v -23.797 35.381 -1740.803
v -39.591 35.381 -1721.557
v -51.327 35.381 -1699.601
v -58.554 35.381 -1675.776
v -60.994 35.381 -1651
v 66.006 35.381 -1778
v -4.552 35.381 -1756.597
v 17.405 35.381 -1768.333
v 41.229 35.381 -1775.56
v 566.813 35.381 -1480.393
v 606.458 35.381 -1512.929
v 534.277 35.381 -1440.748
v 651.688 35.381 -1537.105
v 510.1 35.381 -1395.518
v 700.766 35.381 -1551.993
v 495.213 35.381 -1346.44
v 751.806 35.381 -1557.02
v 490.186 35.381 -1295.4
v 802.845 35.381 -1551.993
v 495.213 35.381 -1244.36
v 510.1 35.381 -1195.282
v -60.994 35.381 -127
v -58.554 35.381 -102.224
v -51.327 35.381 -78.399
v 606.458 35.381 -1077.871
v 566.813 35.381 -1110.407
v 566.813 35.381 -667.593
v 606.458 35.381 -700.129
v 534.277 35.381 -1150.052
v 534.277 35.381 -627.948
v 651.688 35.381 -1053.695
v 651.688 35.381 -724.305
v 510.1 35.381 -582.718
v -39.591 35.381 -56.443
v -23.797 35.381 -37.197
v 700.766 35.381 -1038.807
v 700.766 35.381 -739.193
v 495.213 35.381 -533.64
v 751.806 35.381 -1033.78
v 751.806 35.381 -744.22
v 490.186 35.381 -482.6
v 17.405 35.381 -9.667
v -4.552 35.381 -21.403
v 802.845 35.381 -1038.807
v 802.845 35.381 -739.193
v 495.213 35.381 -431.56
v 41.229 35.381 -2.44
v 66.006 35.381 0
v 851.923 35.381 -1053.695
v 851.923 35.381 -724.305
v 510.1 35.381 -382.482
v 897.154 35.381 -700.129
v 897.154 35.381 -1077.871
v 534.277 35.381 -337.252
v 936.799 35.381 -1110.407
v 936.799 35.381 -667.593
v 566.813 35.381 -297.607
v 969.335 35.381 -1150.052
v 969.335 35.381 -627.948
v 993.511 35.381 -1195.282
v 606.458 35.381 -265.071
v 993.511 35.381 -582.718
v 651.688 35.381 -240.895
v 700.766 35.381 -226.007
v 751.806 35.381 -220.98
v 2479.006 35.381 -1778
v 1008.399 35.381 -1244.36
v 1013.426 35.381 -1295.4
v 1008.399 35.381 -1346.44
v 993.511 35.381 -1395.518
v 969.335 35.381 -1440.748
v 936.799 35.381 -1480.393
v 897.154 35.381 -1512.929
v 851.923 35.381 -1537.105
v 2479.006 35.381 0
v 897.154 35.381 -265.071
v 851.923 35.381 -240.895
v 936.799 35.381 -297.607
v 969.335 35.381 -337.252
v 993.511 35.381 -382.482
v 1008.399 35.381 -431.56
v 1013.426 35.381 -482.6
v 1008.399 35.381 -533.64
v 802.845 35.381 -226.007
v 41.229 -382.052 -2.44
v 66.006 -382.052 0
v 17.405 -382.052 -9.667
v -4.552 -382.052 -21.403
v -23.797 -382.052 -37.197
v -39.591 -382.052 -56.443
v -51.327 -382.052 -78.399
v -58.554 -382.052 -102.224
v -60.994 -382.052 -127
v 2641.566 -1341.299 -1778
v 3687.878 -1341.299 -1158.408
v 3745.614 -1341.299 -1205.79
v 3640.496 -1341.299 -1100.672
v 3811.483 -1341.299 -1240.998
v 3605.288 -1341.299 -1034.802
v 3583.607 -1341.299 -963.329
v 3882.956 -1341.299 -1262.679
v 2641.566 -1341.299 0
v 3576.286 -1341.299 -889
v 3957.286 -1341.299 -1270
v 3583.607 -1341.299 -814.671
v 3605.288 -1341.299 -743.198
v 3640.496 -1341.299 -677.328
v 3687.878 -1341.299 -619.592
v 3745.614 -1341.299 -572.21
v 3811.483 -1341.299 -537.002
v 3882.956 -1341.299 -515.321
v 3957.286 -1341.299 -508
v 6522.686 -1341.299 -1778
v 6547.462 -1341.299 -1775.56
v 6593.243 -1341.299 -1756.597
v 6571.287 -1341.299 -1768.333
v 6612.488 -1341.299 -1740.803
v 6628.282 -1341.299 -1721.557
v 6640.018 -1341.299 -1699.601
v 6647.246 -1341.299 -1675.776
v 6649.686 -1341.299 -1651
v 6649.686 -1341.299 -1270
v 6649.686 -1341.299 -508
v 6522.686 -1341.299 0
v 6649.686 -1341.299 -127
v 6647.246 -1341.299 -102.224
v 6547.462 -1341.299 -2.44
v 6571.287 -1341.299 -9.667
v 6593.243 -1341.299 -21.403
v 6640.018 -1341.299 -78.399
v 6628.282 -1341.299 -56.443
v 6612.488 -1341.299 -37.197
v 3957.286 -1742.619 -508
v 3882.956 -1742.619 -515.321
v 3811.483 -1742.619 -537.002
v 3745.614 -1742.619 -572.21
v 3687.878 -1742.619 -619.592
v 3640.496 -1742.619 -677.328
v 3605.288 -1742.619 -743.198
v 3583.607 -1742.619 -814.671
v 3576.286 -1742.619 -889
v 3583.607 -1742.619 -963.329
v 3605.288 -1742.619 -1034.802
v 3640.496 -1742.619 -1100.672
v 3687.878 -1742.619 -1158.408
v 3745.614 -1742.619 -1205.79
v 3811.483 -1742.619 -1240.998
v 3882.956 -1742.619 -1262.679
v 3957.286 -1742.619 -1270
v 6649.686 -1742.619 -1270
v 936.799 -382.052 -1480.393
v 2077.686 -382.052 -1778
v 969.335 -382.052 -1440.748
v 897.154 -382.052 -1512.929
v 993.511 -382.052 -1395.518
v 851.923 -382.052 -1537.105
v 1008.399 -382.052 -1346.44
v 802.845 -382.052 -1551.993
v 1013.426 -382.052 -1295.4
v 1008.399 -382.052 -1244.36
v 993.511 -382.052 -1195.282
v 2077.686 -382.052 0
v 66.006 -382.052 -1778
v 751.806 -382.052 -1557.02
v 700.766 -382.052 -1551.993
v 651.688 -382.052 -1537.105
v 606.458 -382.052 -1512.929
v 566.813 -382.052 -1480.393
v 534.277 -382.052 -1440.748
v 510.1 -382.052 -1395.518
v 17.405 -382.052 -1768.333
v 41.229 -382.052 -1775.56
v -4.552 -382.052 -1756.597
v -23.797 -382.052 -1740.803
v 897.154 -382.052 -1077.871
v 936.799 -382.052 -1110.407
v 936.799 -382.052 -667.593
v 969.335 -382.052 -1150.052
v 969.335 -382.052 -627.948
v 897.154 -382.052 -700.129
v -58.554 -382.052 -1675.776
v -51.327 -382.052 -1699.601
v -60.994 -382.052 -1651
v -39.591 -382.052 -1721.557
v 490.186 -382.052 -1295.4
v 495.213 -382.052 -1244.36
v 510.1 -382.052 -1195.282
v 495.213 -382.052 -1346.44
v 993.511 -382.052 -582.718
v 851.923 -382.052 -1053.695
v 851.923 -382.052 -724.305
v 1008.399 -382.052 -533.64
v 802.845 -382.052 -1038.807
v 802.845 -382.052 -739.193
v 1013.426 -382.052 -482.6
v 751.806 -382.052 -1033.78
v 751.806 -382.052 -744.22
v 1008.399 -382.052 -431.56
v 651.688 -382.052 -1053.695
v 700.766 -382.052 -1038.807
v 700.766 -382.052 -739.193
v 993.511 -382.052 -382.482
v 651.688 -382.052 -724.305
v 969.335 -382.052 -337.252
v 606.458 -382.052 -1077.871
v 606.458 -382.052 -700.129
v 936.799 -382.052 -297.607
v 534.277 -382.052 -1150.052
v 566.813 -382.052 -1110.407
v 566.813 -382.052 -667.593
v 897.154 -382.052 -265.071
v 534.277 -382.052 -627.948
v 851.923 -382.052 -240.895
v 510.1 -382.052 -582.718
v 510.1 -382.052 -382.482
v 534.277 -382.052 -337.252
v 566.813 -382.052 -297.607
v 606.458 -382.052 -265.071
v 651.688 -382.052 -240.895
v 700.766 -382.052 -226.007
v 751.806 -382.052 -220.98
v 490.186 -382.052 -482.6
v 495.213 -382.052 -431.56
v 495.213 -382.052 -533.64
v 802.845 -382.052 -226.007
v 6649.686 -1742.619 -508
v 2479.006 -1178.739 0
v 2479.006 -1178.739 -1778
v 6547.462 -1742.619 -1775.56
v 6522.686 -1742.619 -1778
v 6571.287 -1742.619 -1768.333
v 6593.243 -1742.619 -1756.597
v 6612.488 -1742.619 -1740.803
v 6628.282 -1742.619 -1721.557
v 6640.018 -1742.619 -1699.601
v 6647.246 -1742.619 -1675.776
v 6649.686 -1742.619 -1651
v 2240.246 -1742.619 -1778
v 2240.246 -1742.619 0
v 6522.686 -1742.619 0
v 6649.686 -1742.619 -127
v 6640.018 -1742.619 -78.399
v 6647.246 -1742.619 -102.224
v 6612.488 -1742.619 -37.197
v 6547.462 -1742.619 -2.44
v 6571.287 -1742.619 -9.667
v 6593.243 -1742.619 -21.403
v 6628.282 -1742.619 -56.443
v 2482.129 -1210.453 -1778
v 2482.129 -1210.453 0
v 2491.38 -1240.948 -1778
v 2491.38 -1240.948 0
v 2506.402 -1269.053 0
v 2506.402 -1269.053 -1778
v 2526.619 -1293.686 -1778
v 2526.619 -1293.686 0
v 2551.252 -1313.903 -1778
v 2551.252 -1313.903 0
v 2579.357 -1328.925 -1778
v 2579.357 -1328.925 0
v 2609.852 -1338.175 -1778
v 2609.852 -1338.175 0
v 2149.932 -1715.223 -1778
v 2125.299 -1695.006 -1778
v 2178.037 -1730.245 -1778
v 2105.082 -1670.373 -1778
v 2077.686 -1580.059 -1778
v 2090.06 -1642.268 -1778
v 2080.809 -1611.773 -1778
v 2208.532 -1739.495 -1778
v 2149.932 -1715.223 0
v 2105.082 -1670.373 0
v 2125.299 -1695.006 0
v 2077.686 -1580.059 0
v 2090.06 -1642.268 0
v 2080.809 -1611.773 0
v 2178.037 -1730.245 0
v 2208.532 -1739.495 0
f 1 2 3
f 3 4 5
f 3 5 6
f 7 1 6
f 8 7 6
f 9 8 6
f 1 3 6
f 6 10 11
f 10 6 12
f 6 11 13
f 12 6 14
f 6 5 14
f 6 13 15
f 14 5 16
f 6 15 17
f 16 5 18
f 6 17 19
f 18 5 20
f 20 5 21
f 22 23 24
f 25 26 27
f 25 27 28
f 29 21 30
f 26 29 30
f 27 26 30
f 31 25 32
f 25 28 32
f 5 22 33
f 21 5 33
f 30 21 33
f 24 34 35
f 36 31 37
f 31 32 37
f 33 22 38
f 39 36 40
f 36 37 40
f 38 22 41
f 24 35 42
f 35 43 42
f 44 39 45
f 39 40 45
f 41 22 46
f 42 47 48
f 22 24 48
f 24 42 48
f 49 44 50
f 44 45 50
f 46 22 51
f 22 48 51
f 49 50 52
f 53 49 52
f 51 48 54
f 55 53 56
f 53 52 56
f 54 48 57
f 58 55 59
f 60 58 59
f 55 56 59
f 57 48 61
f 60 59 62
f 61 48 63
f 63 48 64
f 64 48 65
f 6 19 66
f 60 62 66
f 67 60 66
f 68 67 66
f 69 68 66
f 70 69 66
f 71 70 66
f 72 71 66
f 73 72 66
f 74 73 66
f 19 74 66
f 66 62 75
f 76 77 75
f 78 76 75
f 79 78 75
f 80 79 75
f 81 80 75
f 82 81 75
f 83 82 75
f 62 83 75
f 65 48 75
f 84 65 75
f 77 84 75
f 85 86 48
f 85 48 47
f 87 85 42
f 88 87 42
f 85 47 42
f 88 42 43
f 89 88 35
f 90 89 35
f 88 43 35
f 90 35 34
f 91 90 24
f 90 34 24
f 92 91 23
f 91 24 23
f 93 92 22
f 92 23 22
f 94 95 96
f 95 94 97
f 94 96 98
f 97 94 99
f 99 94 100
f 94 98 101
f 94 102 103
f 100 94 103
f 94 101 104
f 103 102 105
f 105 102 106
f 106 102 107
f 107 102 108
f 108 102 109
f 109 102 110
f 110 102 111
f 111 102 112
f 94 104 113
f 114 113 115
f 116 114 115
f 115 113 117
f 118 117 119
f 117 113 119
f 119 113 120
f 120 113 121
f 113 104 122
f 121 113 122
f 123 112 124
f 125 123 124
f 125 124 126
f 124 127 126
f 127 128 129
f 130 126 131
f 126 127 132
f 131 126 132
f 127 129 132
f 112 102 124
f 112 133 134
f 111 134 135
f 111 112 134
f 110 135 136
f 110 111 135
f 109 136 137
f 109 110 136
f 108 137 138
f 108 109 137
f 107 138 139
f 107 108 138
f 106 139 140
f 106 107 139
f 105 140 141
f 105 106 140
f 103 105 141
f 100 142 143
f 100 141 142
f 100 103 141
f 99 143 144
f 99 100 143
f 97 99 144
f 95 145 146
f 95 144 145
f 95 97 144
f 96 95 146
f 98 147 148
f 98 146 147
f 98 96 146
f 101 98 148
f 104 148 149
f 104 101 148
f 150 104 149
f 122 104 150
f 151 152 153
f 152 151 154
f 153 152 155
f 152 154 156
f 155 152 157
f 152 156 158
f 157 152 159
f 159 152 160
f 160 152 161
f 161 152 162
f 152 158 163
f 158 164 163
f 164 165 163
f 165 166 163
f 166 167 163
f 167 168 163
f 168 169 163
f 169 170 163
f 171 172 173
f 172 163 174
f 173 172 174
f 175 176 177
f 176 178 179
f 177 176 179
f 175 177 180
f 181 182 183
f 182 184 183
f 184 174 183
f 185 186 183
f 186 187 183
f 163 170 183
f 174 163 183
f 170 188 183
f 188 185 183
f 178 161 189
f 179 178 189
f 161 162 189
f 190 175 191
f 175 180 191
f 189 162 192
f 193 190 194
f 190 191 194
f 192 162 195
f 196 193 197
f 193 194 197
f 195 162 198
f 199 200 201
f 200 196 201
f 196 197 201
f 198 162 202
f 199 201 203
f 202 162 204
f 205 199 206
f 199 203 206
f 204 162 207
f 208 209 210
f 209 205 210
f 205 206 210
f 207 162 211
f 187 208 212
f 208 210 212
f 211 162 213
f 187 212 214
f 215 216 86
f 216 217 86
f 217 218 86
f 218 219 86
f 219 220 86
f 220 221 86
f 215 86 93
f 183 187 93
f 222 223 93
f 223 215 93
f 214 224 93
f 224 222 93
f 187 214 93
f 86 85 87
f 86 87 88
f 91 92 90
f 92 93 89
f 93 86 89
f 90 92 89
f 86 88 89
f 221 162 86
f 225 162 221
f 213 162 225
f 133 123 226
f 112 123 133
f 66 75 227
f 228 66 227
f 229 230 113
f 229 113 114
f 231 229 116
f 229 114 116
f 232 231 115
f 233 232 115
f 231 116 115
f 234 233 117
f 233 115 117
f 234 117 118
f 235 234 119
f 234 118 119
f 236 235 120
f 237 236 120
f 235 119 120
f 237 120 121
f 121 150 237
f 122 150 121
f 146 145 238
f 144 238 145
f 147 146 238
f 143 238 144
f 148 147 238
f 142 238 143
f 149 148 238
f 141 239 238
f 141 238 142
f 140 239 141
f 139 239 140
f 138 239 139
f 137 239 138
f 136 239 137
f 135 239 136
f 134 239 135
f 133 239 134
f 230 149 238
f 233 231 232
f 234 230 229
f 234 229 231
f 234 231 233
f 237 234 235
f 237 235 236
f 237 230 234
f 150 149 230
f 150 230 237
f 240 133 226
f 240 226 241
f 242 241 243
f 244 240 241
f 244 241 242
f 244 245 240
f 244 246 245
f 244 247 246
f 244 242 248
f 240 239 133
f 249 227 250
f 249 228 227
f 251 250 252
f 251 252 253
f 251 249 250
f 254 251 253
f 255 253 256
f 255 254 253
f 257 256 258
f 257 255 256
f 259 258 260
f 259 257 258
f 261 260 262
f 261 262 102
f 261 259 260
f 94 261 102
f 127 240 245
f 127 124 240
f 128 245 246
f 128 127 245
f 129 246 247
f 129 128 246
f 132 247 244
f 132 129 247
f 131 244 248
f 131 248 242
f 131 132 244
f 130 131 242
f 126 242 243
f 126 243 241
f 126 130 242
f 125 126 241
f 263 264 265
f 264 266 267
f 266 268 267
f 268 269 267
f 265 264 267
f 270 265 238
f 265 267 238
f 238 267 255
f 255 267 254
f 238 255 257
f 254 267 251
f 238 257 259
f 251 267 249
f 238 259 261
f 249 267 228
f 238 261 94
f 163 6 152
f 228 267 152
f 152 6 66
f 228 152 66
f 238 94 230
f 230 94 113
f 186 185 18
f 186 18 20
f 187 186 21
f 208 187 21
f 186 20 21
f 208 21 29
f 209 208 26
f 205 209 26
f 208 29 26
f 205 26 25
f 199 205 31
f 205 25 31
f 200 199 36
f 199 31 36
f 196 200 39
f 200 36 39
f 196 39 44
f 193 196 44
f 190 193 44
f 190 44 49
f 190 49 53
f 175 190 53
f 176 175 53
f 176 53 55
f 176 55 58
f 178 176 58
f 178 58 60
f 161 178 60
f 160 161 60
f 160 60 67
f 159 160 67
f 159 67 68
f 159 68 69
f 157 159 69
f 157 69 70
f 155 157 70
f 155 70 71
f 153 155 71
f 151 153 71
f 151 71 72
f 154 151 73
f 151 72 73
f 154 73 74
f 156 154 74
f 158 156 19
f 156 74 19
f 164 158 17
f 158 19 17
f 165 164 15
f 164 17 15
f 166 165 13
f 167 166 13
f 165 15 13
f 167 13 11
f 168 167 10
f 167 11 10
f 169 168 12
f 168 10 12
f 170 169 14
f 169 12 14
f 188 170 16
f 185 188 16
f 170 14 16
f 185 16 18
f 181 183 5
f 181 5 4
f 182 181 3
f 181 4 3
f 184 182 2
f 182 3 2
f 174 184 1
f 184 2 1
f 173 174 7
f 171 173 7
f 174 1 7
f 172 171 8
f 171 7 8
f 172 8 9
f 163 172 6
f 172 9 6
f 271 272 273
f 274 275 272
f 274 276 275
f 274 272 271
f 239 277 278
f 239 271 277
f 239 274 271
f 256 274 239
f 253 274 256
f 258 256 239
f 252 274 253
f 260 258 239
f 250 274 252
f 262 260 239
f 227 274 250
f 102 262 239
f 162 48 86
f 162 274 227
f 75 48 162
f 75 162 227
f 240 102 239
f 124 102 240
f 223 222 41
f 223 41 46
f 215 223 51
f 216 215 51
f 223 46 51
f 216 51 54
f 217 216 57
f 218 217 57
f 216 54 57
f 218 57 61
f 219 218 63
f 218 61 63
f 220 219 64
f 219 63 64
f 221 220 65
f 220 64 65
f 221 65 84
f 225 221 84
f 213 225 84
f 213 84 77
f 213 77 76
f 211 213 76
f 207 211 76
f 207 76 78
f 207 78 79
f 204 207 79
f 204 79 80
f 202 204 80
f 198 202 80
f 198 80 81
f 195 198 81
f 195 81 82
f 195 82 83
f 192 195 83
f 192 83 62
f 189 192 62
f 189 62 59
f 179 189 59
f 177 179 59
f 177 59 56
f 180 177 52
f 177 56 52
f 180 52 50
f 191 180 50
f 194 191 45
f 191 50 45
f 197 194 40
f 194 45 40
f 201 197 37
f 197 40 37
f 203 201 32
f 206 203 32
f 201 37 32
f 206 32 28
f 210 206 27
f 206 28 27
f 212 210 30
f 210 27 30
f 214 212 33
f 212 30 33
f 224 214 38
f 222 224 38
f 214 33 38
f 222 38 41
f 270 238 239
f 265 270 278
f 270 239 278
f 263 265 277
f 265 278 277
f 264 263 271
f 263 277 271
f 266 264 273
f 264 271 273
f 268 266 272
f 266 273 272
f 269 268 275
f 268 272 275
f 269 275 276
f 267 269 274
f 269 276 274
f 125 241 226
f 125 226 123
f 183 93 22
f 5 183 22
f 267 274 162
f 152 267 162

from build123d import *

# Parameters (mm, degrees)
SKETCH1_W               = 6710.68
SKETCH1_H               = 1778
EXTRUDE1_DEPTH          = 1778
CUT_EXTRUDE3_DEPTH      = 1
CUT_EXTRUDE3_DEPTH_BACK = 1779
CUT_EXTRUDE4_DEPTH      = 1
CUT_EXTRUDE4_DEPTH_BACK = 1779
CUT_EXTRUDE5_DEPTH      = 1377.68
CUT_EXTRUDE5_DEPTH_BACK = 402.32
SKETCH9_R               = 261.62
CUT_EXTRUDE6_DEPTH      = 1779
FILLET2_R               = 162.56
FILLET3_R               = 162.56
FILLET4_R               = 127


with BuildPart() as part:
    # Sketch1 → Extrude1 (new body)
    with BuildSketch(Plane.XY):
        with Locations((3294.345792298, -853.619018308)):
            Rectangle(SKETCH1_W, SKETCH1_H)
    extrude(amount=-EXTRUDE1_DEPTH)

    # Sketch2 → Cut-Extrude3 (cut, two sides)
    with BuildSketch(Plane.XY) as cut_extrude3_sk:
        Polygon((-13765.426569294, -382.051723335), (-60.994207702, -382.051723335), (2077.685792298, -382.051723335), (2077.685792298, -1758.731723335), (2077.685792298, -15463.164084926), (-16820.007425204, -35315.696831932), (-32663.119786796, -20234.58447034), align=None)
    extrude(amount=CUT_EXTRUDE3_DEPTH, mode=Mode.SUBTRACT)
    extrude(cut_extrude3_sk.sketch, amount=-CUT_EXTRUDE3_DEPTH_BACK, mode=Mode.SUBTRACT)

    # Sketch6 → Cut-Extrude4 (cut, two sides)
    with BuildSketch(Plane.XY) as cut_extrude4_sk:
        Polygon((2479.005792298, 13746.253053907), (2479.005792298, 35.380981692), (2479.005792298, -1341.299018308), (6649.685792298, -1341.299018308), (20360.557864513, -1341.299018308), (38044.03863857, 19616.910820228), (20162.486566356, 34704.462892443), align=None)
    extrude(amount=CUT_EXTRUDE4_DEPTH, mode=Mode.SUBTRACT)
    extrude(cut_extrude4_sk.sketch, amount=-CUT_EXTRUDE4_DEPTH_BACK, mode=Mode.SUBTRACT)

    # Sketch8 → Cut-Extrude5 (cut, two sides)
    with BuildSketch(Plane(origin=(0, -1341.299018308, 0), x_dir=(-1, 0, 0), z_dir=(0, 1, 0))) as cut_extrude5_sk:
        with BuildLine():
            Line((-20319.279646055, -508), (-6649.685792298, -508))
            Line((-6649.685792298, -508), (-3957.285792298, -508))
            ThreePointArc((-3957.285792298, -508), (-3576.285792298, -889), (-3957.285792298, -1270))
            Line((-3957.285792298, -1270), (-6649.685792298, -1270))
            Line((-6649.685792298, -1270), (-20319.279646055, -1270))
            Line((-20319.279646055, -1270), (-47658.467353569, -1270))
            Line((-47658.467353569, -1270), (-47658.467353569, -508))
            Line((-47658.467353569, -508), (-20319.279646055, -508))
        make_face()
    extrude(amount=CUT_EXTRUDE5_DEPTH, mode=Mode.SUBTRACT)
    extrude(cut_extrude5_sk.sketch, amount=-CUT_EXTRUDE5_DEPTH_BACK, mode=Mode.SUBTRACT)

    # Sketch9 → Cut-Extrude6 (cut, through all)
    with BuildSketch(Plane(origin=(0, 35.380981692, 0), x_dir=(-1, 0, 0), z_dir=(0, 1, 0))):
        with Locations((-751.805792298, -1295.4)):
            Circle(SKETCH9_R)
        with Locations((-751.805792298, -482.6)):
            Circle(SKETCH9_R)
    extrude(amount=-CUT_EXTRUDE6_DEPTH, mode=Mode.SUBTRACT)

    # Fillet2
    fillet2_edges = [part.edges().sort_by_distance(p)[0] for p in [
        (2479.005792298, -1341.299018308, -889),
    ]]
    fillet(fillet2_edges, radius=FILLET2_R)

    # Fillet3
    fillet3_edges = [part.edges().sort_by_distance(p)[0] for p in [
        (2077.685792298, -1742.619018308, -889),
    ]]
    fillet(fillet3_edges, radius=FILLET3_R)

    # Fillet4
    fillet4_edges = [part.edges().sort_by_distance(p)[0] for p in [
        (6649.685792298, -1541.959018308, -1778),
        (-60.994207702, -173.335370821, -1778),
        (6649.685792298, -1541.959018308, 0),
        (-60.994207702, -173.335370821, 0),
    ]]
    fillet(fillet4_edges, radius=FILLET4_R)


solid = part.part
